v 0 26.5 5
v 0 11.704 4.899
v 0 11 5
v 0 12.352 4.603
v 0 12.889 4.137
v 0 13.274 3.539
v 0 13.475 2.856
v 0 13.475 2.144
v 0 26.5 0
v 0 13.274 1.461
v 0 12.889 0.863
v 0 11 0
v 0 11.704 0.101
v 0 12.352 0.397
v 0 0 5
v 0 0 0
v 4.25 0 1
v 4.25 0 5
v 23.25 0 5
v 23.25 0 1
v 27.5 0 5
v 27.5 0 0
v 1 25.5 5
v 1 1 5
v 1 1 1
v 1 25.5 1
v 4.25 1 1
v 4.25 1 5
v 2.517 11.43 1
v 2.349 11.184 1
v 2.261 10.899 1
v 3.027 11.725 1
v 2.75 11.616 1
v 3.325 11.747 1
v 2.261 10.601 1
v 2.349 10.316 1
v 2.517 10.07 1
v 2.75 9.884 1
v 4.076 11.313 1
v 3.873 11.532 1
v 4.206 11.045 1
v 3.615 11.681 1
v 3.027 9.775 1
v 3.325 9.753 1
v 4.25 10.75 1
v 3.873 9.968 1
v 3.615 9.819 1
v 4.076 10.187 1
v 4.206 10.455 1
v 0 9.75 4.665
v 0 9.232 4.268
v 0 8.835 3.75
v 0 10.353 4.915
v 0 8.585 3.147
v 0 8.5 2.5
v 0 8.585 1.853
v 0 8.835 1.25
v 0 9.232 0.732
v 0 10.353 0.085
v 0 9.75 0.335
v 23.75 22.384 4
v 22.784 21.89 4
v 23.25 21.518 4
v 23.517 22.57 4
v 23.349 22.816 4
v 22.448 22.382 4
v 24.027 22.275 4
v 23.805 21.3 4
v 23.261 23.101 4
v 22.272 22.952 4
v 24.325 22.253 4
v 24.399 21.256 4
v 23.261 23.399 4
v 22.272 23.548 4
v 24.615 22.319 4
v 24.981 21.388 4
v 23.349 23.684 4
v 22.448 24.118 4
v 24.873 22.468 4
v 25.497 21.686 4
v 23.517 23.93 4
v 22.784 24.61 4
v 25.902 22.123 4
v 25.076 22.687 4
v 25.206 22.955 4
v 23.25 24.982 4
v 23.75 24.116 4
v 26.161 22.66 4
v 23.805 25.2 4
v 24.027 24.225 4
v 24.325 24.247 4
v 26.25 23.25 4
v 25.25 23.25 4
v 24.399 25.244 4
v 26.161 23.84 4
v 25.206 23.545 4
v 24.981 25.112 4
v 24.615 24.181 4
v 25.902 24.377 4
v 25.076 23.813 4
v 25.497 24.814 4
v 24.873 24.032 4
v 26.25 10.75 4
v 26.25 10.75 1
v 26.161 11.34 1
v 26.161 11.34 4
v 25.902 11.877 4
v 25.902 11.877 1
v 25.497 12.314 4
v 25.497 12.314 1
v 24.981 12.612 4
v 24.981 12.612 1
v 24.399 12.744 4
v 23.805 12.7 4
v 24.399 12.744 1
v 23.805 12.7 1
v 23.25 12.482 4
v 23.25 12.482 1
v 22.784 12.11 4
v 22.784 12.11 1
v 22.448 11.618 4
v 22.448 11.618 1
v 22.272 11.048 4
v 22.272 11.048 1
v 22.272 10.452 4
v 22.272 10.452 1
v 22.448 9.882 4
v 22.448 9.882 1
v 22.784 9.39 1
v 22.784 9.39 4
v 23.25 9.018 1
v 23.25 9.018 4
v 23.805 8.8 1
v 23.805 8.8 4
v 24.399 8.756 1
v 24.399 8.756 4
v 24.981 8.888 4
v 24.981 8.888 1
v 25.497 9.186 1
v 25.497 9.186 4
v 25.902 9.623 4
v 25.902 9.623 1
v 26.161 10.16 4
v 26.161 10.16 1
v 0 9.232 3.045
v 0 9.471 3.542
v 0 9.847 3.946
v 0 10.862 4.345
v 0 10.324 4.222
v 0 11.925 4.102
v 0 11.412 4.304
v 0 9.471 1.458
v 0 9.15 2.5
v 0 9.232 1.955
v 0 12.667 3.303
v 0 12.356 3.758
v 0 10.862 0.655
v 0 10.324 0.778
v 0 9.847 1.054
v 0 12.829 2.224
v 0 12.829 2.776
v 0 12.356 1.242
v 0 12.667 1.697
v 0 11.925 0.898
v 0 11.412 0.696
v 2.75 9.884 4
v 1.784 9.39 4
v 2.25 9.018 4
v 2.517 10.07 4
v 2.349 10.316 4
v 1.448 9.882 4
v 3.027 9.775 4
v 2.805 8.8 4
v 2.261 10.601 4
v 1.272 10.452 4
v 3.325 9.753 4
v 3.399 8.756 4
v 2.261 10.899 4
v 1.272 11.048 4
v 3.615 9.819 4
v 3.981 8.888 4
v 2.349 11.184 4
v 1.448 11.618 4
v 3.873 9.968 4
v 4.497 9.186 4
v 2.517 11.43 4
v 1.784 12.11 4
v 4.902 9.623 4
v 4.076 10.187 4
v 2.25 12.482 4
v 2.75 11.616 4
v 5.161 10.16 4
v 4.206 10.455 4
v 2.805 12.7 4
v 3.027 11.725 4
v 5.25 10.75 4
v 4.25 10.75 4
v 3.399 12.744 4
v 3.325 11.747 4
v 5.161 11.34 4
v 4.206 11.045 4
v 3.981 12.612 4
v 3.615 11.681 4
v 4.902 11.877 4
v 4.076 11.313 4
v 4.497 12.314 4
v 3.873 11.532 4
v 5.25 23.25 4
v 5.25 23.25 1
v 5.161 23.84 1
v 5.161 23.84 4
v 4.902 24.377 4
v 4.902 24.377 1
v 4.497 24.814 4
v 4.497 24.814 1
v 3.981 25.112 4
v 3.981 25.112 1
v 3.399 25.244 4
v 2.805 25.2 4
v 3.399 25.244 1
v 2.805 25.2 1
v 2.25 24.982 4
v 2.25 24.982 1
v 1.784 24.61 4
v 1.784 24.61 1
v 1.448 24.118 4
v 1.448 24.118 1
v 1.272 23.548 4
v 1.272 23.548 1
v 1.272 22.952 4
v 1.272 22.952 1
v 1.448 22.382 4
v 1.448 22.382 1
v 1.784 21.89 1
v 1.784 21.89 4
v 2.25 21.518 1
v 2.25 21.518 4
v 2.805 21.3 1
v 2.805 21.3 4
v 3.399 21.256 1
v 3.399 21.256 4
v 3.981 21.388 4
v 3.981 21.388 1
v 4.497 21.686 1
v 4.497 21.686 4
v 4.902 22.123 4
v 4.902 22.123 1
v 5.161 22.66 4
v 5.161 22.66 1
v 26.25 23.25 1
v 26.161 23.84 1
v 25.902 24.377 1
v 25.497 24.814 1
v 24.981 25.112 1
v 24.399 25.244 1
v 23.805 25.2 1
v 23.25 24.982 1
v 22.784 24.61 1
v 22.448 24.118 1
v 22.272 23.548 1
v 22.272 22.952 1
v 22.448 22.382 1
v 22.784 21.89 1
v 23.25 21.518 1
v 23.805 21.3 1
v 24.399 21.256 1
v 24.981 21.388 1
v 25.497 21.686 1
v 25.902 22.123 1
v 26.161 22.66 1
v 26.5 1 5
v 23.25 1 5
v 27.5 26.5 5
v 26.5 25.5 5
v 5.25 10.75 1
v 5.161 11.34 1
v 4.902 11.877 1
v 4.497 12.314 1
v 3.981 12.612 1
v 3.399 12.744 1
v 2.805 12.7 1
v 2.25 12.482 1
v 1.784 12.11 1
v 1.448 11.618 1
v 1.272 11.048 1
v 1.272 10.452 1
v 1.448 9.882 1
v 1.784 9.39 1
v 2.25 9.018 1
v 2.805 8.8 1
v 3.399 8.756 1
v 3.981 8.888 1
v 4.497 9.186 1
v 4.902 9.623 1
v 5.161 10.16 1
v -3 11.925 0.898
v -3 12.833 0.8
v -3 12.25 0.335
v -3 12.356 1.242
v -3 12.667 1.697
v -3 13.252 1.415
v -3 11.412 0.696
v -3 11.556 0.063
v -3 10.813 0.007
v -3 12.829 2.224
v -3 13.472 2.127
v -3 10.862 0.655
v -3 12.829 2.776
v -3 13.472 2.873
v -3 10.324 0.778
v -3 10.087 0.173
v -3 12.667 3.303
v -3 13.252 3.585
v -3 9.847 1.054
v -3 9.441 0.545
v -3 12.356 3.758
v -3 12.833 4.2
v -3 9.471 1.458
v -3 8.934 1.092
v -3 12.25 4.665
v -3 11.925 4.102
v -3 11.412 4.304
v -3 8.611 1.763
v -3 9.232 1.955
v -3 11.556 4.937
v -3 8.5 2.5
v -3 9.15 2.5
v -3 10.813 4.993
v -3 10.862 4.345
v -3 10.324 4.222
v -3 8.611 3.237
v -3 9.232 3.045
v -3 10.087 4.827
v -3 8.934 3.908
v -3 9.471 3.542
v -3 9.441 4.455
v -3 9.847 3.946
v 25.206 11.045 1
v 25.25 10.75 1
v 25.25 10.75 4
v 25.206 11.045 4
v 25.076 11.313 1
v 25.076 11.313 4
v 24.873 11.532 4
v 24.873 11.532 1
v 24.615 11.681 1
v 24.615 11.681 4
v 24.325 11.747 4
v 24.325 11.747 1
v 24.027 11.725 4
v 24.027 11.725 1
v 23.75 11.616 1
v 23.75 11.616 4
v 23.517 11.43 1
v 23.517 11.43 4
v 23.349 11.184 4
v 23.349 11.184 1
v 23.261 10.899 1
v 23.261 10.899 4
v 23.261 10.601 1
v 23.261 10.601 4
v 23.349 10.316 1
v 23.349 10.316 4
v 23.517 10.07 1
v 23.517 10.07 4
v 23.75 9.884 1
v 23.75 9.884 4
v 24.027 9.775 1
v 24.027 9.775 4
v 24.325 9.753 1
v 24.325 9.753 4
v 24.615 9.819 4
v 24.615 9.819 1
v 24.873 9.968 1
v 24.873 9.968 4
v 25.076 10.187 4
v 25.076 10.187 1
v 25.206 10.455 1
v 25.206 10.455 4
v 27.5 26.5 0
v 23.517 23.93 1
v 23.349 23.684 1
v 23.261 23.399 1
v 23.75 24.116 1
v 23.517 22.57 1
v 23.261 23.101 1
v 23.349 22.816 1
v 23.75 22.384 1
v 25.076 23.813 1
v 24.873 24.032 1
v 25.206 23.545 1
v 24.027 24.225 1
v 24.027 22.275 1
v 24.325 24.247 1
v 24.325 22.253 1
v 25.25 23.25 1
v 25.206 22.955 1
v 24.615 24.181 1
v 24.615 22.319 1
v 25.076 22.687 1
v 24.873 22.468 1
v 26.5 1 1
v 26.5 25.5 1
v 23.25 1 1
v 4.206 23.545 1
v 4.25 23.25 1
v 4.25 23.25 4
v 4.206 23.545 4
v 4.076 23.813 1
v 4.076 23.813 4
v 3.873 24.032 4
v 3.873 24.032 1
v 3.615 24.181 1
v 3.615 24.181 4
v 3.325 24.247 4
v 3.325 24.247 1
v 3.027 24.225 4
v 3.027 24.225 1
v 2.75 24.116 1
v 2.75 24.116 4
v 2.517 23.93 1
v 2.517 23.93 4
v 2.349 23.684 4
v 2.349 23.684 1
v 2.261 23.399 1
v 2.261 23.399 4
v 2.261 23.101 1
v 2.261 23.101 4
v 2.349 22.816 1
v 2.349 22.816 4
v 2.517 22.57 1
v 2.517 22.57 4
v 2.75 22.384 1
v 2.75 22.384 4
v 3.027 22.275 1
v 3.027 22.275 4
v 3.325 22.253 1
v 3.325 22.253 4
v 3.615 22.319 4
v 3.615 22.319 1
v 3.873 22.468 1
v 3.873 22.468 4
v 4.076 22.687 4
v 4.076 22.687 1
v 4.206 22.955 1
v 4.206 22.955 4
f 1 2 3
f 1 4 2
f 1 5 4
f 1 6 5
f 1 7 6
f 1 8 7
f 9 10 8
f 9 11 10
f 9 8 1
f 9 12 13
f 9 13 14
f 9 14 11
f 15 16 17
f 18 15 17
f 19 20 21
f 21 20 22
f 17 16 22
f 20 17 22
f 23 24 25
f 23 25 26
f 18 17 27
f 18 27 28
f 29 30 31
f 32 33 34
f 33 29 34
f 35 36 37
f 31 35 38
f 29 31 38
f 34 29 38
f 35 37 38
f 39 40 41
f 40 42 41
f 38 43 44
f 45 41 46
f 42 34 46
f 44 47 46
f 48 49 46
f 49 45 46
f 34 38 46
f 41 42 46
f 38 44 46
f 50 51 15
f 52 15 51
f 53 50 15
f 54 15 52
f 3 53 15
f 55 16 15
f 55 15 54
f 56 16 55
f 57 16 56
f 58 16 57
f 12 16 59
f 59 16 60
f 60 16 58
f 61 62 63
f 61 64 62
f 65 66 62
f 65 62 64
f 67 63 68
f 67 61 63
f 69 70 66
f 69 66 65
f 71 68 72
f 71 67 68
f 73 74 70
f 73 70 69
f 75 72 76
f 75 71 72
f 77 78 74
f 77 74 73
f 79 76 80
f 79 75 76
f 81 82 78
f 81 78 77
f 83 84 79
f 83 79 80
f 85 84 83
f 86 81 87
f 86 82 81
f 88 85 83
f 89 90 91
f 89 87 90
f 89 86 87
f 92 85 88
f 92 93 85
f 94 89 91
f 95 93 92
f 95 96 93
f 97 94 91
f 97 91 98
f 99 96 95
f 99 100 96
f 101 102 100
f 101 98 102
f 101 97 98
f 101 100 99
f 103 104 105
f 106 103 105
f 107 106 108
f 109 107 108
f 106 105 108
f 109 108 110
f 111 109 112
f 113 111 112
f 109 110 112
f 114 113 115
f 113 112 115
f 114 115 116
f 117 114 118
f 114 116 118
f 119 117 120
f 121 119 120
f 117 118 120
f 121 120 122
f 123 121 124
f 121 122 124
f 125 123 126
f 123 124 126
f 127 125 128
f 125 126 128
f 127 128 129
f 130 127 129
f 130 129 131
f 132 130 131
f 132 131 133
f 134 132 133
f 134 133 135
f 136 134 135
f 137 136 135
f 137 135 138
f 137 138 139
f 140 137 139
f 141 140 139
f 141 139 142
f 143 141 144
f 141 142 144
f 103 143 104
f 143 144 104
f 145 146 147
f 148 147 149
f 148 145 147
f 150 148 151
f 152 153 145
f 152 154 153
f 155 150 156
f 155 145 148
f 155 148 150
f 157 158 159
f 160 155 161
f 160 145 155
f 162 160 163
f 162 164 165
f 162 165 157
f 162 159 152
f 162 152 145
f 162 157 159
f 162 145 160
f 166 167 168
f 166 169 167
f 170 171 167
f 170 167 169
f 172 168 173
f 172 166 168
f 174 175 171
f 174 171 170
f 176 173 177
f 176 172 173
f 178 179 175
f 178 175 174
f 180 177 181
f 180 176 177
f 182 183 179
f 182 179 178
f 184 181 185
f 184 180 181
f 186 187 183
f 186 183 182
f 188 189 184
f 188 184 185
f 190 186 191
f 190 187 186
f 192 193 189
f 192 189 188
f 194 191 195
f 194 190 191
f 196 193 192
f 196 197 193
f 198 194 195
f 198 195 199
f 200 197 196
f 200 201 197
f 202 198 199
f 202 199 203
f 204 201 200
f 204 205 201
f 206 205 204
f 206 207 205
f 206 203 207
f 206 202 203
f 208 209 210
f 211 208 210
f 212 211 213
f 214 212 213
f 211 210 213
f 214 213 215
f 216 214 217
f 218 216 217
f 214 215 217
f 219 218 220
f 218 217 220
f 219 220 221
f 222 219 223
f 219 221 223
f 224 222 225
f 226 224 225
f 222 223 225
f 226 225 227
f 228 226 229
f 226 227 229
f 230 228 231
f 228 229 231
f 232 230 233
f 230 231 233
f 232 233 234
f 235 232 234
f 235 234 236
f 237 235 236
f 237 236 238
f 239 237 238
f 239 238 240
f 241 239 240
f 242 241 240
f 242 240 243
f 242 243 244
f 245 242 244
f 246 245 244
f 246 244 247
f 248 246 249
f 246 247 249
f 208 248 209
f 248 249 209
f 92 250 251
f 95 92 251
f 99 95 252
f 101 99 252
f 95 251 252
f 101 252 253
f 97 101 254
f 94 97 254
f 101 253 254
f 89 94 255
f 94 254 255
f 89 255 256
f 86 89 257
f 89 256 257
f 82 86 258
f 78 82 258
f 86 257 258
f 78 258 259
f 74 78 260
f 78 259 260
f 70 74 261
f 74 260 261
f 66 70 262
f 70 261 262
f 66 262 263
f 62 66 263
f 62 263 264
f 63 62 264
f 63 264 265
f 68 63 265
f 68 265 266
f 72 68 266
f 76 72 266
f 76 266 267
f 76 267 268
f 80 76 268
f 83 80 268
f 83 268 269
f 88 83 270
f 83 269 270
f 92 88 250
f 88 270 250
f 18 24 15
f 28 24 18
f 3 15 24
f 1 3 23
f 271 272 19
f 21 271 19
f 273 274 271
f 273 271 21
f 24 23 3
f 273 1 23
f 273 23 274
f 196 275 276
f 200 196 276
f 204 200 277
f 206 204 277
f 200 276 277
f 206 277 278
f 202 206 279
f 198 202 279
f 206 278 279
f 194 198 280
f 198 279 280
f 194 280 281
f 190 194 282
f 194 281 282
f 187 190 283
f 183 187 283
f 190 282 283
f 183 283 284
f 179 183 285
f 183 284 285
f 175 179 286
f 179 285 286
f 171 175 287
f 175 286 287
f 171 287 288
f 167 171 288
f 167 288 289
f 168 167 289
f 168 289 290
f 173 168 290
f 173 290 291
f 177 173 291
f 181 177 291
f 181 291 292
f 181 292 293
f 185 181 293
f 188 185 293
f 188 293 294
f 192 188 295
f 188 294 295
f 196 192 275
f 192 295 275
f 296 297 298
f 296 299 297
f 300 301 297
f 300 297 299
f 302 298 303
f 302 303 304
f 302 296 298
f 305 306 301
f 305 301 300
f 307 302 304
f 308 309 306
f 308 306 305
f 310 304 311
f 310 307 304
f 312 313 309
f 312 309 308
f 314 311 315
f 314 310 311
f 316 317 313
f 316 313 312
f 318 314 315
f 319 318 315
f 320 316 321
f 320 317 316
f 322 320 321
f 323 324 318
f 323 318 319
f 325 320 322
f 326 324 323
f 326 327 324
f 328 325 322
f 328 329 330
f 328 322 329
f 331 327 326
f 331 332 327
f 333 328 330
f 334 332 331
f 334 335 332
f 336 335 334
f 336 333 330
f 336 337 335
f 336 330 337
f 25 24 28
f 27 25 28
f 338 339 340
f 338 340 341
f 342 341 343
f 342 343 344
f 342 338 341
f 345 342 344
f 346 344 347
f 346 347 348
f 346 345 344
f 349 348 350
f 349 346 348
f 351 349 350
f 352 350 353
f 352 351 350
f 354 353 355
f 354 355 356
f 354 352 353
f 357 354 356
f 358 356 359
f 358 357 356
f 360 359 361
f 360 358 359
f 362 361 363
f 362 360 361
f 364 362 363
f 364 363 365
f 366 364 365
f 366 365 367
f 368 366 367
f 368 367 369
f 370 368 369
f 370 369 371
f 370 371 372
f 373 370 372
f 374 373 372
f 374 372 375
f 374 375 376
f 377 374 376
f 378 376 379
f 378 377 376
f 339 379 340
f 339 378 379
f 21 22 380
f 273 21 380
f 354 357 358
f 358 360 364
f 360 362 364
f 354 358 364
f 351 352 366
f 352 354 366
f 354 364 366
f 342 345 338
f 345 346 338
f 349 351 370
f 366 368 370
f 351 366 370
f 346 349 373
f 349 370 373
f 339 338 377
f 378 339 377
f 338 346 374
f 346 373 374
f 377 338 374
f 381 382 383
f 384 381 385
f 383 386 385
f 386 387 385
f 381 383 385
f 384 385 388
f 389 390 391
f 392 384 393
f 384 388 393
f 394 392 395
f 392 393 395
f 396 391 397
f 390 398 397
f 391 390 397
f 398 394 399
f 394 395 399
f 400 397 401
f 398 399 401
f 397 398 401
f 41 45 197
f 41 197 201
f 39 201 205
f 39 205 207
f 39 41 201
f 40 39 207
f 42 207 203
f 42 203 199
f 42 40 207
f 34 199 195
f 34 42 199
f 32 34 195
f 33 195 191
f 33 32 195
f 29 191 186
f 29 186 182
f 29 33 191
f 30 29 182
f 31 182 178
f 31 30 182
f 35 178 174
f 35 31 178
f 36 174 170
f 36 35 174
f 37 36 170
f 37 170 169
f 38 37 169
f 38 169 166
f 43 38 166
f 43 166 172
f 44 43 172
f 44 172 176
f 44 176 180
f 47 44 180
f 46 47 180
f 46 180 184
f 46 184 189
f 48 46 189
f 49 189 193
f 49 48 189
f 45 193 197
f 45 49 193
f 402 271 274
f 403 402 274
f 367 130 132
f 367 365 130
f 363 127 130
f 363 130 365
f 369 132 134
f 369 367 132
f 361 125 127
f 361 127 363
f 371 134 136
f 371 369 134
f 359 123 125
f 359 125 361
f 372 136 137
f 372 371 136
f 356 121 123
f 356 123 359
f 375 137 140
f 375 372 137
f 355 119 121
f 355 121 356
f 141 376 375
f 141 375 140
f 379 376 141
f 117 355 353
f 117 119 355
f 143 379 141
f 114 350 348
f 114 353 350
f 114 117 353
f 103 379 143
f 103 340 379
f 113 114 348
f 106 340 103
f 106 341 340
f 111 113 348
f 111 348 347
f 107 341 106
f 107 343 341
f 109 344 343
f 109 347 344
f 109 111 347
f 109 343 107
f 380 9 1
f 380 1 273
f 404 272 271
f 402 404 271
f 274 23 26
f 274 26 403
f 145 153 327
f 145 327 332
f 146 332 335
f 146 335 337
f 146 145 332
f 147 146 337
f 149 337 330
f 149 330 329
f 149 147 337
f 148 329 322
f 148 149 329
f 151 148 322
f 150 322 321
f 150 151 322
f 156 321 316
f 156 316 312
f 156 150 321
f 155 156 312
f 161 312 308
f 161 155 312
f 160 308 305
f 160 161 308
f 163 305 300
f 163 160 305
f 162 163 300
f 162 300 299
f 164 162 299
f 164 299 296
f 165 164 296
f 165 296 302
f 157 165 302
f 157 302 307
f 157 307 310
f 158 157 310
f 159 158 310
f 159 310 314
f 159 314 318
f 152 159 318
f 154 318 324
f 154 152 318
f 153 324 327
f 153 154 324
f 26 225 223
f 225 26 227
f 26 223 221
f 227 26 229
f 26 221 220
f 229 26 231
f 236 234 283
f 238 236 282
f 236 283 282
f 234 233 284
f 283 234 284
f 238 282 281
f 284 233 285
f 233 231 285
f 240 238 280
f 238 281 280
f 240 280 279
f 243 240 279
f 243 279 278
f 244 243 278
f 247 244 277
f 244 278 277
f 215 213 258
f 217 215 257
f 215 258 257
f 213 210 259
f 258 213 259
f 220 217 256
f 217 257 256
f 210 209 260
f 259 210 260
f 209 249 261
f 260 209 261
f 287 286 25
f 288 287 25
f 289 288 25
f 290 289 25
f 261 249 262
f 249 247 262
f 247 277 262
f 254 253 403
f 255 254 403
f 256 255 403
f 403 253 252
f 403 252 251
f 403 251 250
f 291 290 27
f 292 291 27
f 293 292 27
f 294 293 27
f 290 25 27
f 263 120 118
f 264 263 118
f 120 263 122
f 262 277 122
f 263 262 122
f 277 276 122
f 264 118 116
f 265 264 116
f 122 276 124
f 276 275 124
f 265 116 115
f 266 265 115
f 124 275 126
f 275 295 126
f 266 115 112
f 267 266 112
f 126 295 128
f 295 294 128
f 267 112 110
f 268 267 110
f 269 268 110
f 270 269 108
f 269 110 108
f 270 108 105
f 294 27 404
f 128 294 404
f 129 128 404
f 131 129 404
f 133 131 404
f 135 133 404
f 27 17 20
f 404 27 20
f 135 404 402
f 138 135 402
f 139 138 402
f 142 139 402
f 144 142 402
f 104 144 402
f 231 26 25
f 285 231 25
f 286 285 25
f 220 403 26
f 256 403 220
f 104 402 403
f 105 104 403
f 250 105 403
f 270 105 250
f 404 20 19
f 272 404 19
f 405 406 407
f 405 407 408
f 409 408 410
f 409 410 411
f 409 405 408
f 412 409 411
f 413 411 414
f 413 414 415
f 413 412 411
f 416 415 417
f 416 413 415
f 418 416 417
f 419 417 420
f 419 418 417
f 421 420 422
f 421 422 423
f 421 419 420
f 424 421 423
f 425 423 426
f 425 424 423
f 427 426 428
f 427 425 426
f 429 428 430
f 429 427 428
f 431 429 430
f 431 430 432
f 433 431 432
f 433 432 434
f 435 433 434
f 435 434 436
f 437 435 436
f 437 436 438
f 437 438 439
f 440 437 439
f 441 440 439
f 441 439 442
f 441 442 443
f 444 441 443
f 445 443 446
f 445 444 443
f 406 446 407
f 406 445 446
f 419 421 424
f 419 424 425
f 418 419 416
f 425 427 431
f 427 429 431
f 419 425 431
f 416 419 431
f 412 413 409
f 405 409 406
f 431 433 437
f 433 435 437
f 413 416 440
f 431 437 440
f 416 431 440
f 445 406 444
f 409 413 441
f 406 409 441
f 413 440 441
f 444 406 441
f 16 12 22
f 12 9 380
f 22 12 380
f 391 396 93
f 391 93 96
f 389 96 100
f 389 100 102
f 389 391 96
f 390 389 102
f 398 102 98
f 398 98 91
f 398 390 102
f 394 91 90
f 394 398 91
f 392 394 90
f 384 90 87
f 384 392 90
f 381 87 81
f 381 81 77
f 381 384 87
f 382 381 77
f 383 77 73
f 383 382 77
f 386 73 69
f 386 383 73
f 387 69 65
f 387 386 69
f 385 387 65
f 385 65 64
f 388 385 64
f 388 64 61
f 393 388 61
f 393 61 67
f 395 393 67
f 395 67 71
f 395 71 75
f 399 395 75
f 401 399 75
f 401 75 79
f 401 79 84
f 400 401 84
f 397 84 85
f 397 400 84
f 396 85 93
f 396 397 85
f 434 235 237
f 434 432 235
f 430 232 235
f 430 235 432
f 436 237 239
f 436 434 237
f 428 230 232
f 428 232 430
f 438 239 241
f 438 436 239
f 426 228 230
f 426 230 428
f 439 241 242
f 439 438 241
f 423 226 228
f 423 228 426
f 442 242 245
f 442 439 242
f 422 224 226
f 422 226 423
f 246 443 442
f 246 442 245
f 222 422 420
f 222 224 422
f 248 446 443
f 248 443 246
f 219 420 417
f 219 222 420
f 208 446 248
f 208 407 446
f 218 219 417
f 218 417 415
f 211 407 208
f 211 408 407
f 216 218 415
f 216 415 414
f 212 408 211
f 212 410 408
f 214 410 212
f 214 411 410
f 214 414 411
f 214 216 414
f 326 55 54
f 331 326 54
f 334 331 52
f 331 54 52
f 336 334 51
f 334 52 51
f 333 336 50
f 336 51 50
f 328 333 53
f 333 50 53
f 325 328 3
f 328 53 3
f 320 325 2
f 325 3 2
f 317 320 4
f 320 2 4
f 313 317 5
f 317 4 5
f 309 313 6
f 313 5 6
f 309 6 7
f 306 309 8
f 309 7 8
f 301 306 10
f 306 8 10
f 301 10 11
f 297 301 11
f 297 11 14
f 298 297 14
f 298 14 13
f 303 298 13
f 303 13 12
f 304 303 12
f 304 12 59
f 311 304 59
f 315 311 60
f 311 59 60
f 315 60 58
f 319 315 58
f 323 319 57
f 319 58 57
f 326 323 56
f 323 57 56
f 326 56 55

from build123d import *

# Parameters (mm, degrees)
SKETCH_W        = 27.5
SKETCH_H        = 26.5
PAD_DEPTH       = 5
SKETCH001_W     = 25.5
SKETCH001_H     = 24.5
POCKET_DEPTH    = 4
SKETCH002_W     = 19
SKETCH002_H     = 4
POCKET001_DEPTH = 1
SKETCH003_R     = 2
SKETCH003_R_2   = 1
PAD001_DEPTH    = 3
SKETCH004_R     = 2.5
SKETCH004_R_2   = 1.85
PAD002_DEPTH    = 3


with BuildPart() as part:
    # Sketch → Pad (new body)
    with BuildSketch(Plane.XY):
        with Locations((13.75, 13.25)):
            Rectangle(SKETCH_W, SKETCH_H)
    extrude(amount=PAD_DEPTH)

    # Sketch001 → Pocket (cut)
    with BuildSketch(Plane.XY.offset(5)):
        with Locations((13.75, 13.25)):
            Rectangle(SKETCH001_W, SKETCH001_H)
    extrude(amount=-POCKET_DEPTH, mode=Mode.SUBTRACT)

    # Sketch002 → Pocket001 (cut)
    with BuildSketch(Plane.XZ):
        with Locations((13.75, 3)):
            Rectangle(SKETCH002_W, SKETCH002_H)
    extrude(amount=-POCKET001_DEPTH, mode=Mode.SUBTRACT)

    # Sketch003 → Pad001 (new body)
    with BuildSketch(Plane.XY.offset(1)):
        with Locations((24.25, 10.75)):
            Circle(SKETCH003_R)
        with Locations((24.25, 10.75)):
            Circle(SKETCH003_R_2, mode=Mode.SUBTRACT)
        with Locations((3.25, 10.75)):
            Circle(SKETCH003_R)
        with Locations((3.25, 10.75)):
            Circle(SKETCH003_R_2, mode=Mode.SUBTRACT)
        with Locations((3.25, 23.25)):
            Circle(SKETCH003_R)
        with Locations((3.25, 23.25)):
            Circle(SKETCH003_R_2, mode=Mode.SUBTRACT)
        with Locations((24.25, 23.25)):
            Circle(SKETCH003_R)
        with Locations((24.25, 23.25)):
            Circle(SKETCH003_R_2, mode=Mode.SUBTRACT)
    extrude(amount=PAD001_DEPTH)

    # Sketch004 → Pad002 (new body)
    with BuildSketch(Plane(origin=(0, 0, 0), x_dir=(0, -1, 0), z_dir=(-1, 0, 0))):
        with Locations((-11, 2.5)):
            Circle(SKETCH004_R)
        with Locations((-11, 2.5)):
            Circle(SKETCH004_R_2, mode=Mode.SUBTRACT)
    extrude(amount=PAD002_DEPTH)


solid = part.part
